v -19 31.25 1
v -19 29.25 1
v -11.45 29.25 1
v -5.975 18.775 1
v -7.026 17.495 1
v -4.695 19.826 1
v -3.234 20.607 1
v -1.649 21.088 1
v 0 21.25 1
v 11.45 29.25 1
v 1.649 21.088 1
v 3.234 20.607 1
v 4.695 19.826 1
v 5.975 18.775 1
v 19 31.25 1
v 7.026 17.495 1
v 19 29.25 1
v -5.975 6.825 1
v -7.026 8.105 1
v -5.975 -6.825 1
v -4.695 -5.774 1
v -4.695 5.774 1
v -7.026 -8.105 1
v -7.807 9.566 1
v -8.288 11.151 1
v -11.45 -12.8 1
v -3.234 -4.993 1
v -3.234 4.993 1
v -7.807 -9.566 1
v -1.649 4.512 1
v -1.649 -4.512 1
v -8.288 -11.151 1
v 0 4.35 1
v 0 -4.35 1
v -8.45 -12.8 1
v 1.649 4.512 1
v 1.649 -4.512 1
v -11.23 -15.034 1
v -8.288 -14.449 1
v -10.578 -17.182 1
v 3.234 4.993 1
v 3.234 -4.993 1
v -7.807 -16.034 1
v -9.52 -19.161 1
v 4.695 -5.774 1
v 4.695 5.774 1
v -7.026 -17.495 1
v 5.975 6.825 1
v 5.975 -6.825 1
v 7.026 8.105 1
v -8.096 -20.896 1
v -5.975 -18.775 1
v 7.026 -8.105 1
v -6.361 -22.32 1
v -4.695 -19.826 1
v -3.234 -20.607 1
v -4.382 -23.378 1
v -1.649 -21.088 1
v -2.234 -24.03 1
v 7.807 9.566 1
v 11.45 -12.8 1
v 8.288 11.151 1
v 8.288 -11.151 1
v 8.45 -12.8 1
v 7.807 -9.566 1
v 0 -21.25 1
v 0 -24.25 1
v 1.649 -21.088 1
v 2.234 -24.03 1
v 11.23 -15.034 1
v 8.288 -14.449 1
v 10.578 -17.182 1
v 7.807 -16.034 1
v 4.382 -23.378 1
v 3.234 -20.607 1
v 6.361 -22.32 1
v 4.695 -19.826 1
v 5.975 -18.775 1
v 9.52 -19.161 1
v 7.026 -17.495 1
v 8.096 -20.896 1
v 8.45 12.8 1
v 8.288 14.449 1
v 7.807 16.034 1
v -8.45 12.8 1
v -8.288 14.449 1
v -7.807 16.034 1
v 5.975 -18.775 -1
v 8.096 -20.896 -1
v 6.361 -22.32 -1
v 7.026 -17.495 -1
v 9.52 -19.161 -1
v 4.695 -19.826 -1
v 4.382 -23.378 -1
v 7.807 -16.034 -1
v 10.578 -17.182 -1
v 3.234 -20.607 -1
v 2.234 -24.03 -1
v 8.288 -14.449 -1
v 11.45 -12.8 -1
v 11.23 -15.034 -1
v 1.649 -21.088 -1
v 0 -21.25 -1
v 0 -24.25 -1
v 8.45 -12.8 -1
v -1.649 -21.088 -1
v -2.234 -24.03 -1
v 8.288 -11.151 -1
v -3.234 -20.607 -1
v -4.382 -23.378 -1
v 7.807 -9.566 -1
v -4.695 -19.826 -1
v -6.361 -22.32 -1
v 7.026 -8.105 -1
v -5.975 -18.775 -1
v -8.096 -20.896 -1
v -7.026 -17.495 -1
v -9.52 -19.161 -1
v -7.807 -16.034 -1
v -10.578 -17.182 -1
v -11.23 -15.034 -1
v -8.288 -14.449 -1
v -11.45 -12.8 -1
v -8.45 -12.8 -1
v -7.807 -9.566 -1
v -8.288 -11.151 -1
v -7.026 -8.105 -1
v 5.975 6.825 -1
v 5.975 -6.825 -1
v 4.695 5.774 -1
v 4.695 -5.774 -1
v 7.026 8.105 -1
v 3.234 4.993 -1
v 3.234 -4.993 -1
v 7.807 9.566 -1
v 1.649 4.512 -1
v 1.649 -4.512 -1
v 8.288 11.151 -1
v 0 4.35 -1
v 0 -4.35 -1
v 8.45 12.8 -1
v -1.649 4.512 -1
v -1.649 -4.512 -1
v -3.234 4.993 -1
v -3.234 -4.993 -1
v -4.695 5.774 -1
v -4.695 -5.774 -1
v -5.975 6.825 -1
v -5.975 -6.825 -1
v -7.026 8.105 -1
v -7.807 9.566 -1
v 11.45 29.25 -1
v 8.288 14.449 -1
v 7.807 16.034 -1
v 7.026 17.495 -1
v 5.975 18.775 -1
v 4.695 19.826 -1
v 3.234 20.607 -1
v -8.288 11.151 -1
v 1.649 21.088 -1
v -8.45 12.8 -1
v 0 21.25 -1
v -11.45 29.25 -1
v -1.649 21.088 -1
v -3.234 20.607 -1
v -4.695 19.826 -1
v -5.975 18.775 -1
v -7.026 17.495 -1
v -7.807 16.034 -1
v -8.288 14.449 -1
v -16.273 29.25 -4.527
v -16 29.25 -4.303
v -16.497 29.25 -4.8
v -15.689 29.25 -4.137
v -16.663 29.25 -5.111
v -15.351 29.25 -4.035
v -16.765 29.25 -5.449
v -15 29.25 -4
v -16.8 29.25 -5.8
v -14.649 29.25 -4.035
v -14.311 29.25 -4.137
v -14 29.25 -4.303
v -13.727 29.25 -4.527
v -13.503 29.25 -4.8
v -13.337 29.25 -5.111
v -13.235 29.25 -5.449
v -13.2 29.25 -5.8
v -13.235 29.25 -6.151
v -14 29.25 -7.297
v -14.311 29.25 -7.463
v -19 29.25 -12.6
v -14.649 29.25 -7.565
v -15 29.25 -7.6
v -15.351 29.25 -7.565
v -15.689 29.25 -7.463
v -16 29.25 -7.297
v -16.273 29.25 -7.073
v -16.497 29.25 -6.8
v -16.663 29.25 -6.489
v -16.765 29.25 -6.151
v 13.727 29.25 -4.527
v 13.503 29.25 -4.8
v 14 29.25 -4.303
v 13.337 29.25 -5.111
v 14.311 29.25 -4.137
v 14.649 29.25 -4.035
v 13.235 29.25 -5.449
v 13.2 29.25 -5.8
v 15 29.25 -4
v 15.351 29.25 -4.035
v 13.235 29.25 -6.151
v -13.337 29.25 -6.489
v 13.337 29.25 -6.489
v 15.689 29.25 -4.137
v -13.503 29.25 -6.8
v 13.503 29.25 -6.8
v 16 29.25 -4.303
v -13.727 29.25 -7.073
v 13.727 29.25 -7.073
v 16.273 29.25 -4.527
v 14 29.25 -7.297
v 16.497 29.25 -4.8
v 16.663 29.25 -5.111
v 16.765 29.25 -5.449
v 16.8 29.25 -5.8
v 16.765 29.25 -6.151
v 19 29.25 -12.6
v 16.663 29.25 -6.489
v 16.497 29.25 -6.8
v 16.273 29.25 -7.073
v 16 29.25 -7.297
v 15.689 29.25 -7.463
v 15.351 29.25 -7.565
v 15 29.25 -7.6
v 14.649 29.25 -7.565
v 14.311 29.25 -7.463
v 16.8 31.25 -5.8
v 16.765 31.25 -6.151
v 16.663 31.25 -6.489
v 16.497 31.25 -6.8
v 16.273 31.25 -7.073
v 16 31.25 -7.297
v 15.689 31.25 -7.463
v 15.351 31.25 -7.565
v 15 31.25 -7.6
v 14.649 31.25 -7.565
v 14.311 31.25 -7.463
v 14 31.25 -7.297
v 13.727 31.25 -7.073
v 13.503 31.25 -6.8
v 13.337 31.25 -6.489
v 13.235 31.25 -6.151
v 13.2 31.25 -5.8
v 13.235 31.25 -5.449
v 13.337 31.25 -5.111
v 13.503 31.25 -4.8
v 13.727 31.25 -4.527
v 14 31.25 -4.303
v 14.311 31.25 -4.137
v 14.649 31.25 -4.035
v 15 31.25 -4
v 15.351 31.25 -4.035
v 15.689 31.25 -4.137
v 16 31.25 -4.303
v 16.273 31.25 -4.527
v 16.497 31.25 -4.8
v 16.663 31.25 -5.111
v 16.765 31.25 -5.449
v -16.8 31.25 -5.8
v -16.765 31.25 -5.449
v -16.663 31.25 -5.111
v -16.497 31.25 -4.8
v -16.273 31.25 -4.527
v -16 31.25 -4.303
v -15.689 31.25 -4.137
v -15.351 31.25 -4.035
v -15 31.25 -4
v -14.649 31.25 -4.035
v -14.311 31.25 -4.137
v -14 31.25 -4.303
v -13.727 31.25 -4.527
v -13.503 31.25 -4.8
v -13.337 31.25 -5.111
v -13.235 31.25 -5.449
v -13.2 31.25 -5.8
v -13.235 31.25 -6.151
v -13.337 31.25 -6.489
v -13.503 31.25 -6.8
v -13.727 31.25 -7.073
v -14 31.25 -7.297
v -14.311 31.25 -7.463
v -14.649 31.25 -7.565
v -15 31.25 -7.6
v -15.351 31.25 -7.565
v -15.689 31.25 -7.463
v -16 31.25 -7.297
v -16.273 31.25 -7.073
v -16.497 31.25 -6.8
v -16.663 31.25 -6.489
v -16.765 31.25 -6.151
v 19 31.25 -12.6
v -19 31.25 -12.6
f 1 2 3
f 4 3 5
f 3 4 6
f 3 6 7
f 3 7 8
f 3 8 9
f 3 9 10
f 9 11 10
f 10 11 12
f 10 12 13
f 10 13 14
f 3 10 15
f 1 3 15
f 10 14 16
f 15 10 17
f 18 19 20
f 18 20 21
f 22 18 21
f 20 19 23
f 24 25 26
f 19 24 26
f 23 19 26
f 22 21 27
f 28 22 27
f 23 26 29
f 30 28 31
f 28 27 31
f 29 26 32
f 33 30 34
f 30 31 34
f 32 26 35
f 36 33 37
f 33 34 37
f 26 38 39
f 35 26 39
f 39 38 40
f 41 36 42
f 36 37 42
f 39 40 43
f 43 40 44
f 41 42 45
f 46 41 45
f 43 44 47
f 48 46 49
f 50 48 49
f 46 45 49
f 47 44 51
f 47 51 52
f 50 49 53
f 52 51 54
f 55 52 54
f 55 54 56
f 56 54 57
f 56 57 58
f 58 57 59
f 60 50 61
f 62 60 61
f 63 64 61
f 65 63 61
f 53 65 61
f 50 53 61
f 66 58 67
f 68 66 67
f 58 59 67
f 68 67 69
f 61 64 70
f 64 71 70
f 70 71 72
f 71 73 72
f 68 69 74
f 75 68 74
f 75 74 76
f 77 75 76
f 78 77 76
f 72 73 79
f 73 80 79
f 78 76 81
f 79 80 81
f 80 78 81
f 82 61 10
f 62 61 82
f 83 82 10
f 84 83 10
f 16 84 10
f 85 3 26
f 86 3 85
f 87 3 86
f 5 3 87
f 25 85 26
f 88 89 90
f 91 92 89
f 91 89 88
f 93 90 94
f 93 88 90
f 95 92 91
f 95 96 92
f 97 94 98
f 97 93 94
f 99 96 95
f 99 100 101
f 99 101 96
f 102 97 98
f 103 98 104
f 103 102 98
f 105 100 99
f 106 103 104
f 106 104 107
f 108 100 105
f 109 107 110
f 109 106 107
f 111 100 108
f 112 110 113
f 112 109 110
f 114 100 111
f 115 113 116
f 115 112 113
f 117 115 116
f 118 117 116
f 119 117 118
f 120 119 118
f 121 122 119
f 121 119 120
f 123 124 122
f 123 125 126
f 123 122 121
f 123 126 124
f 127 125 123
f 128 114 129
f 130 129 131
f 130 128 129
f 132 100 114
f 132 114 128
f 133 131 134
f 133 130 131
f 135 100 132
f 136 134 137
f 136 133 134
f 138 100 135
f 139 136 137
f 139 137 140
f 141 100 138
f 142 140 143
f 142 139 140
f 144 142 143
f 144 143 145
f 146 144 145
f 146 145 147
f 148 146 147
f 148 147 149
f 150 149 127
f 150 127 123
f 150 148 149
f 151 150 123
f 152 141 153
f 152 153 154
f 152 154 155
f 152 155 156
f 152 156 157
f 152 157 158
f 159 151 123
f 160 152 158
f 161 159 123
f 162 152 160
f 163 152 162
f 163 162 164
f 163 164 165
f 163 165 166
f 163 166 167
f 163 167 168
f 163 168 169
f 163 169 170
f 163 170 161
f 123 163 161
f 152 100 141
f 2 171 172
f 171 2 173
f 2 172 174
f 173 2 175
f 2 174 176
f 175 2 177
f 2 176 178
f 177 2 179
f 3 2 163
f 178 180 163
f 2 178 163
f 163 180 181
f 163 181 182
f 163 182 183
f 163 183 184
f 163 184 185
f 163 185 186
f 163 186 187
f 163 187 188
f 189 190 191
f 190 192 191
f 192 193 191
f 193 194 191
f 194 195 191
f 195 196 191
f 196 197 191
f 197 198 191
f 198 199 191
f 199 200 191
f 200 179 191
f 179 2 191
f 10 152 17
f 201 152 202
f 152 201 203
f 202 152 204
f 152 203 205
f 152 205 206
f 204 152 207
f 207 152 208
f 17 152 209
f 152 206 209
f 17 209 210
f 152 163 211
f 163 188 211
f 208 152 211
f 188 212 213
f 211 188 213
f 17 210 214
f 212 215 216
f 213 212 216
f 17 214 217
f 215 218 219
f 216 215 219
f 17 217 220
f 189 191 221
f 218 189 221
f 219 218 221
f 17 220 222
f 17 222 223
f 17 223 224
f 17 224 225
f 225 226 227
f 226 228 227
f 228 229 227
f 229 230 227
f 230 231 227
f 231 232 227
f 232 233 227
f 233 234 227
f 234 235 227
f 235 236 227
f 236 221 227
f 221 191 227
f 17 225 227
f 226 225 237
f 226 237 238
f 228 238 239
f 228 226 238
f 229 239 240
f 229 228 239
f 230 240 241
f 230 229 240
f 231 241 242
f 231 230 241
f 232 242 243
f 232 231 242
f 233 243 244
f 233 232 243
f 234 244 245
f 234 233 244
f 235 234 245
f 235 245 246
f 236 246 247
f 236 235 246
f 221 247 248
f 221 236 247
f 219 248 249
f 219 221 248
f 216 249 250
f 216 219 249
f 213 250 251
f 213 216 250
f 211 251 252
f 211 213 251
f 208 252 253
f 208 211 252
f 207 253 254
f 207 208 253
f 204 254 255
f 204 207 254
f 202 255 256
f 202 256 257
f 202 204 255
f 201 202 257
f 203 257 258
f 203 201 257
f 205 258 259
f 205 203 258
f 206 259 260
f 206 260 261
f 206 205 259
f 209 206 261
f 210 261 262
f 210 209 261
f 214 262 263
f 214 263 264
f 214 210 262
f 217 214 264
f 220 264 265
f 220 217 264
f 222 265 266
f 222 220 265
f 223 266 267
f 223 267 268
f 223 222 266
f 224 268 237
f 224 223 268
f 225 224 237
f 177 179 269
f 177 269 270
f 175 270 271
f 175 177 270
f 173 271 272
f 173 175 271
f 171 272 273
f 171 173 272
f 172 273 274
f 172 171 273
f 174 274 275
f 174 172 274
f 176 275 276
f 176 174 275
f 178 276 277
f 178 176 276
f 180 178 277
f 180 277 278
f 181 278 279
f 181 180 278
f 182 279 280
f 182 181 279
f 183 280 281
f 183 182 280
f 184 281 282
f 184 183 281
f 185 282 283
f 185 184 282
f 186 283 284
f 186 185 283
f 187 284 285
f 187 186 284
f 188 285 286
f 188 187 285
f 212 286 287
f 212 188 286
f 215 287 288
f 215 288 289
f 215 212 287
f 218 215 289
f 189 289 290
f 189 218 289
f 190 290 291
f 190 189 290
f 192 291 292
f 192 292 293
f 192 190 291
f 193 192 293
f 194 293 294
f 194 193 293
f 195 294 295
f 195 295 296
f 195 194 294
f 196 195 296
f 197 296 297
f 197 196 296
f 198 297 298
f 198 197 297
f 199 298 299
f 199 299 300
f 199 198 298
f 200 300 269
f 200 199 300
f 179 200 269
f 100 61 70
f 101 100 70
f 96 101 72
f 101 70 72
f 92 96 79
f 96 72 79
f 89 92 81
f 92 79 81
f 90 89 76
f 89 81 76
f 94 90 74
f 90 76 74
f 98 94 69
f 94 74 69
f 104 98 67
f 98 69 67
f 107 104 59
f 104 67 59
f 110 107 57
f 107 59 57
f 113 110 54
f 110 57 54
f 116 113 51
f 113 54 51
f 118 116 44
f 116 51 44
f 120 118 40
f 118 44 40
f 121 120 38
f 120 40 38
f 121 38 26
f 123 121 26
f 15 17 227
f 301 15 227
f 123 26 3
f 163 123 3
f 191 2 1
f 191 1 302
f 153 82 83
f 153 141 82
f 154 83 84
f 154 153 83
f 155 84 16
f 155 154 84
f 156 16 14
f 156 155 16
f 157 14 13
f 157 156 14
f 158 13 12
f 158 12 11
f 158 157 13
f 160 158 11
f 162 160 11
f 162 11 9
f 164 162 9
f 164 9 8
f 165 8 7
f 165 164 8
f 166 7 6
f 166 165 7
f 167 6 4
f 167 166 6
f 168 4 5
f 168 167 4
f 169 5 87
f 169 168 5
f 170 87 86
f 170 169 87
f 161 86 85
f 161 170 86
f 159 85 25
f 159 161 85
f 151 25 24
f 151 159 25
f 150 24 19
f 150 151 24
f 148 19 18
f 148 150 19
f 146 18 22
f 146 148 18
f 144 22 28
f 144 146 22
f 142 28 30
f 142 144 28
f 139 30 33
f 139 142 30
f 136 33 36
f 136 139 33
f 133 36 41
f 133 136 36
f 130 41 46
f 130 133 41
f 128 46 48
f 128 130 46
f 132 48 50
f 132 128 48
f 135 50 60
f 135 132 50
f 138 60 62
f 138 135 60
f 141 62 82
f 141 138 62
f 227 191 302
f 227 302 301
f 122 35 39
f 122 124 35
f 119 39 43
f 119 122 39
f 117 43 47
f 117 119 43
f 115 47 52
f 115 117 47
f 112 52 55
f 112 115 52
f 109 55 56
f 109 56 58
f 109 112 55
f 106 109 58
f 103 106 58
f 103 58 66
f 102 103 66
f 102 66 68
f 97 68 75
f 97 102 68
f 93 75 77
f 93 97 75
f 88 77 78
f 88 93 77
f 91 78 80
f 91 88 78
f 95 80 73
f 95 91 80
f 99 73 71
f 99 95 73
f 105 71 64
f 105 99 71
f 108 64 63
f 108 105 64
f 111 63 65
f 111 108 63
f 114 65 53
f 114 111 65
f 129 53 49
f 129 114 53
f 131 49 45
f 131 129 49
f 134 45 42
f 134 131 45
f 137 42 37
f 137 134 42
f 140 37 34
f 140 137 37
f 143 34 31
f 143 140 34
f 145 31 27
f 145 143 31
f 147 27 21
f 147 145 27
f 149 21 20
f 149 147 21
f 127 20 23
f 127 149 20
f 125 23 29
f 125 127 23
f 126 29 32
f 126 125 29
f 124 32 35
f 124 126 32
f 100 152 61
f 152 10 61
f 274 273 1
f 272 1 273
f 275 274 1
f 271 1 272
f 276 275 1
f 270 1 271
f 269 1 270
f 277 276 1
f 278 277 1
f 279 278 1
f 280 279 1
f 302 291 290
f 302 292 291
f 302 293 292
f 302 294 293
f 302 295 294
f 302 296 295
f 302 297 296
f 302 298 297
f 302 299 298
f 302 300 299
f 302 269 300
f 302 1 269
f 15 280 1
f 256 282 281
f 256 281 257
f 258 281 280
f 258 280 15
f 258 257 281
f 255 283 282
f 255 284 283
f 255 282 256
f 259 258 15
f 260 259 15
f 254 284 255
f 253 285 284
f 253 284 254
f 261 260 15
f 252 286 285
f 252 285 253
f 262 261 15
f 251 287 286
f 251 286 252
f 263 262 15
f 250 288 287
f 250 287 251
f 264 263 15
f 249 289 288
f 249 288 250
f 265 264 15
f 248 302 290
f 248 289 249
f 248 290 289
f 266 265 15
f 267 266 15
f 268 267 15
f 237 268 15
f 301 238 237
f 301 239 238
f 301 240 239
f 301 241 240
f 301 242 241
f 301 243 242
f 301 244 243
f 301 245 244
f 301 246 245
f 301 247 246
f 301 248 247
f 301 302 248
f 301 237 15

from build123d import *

# Parameters (mm, degrees)
SKETCH1_R           = 8.45
BOSS_EXTRUDE1_DEPTH = 1
SKETCH4_W           = 38
SKETCH4_H           = 13.6
SKETCH4_R           = 1.8
BOSS_EXTRUDE2_DEPTH = 2


with BuildPart() as part:
    # Sketch1 → Boss-Extrude1 (new, symmetric)
    with BuildSketch(Plane.XY):
        with BuildLine():
            Line((-11.45, -12.8), (-11.45, 29.25))
            Line((-11.45, 29.25), (11.45, 29.25))
            Line((11.45, 29.25), (11.45, -12.8))
            ThreePointArc((11.45, -12.8), (0, -24.25), (-11.45, -12.8))
        make_face()
        with Locations((0, 12.8)):
            Circle(SKETCH1_R, mode=Mode.SUBTRACT)
        with Locations(Location((0, -12.8, 0), (0, 0, 180))):
            Circle(SKETCH1_R, mode=Mode.SUBTRACT)
    extrude(amount=BOSS_EXTRUDE1_DEPTH, both=True)

    # Sketch4 → Boss-Extrude2 (add)
    with BuildSketch(Plane(origin=(0, 29.25, 0), x_dir=(1, 0, 0), z_dir=(0, 1, 0))):
        with Locations((0, 5.8)):
            Rectangle(SKETCH4_W, SKETCH4_H)
        with Locations(Location((-15, 5.8, 0), (0, 0, 180))):
            Circle(SKETCH4_R, mode=Mode.SUBTRACT)
        with Locations((15, 5.8)):
            Circle(SKETCH4_R, mode=Mode.SUBTRACT)
    extrude(amount=BOSS_EXTRUDE2_DEPTH)


solid = part.part
